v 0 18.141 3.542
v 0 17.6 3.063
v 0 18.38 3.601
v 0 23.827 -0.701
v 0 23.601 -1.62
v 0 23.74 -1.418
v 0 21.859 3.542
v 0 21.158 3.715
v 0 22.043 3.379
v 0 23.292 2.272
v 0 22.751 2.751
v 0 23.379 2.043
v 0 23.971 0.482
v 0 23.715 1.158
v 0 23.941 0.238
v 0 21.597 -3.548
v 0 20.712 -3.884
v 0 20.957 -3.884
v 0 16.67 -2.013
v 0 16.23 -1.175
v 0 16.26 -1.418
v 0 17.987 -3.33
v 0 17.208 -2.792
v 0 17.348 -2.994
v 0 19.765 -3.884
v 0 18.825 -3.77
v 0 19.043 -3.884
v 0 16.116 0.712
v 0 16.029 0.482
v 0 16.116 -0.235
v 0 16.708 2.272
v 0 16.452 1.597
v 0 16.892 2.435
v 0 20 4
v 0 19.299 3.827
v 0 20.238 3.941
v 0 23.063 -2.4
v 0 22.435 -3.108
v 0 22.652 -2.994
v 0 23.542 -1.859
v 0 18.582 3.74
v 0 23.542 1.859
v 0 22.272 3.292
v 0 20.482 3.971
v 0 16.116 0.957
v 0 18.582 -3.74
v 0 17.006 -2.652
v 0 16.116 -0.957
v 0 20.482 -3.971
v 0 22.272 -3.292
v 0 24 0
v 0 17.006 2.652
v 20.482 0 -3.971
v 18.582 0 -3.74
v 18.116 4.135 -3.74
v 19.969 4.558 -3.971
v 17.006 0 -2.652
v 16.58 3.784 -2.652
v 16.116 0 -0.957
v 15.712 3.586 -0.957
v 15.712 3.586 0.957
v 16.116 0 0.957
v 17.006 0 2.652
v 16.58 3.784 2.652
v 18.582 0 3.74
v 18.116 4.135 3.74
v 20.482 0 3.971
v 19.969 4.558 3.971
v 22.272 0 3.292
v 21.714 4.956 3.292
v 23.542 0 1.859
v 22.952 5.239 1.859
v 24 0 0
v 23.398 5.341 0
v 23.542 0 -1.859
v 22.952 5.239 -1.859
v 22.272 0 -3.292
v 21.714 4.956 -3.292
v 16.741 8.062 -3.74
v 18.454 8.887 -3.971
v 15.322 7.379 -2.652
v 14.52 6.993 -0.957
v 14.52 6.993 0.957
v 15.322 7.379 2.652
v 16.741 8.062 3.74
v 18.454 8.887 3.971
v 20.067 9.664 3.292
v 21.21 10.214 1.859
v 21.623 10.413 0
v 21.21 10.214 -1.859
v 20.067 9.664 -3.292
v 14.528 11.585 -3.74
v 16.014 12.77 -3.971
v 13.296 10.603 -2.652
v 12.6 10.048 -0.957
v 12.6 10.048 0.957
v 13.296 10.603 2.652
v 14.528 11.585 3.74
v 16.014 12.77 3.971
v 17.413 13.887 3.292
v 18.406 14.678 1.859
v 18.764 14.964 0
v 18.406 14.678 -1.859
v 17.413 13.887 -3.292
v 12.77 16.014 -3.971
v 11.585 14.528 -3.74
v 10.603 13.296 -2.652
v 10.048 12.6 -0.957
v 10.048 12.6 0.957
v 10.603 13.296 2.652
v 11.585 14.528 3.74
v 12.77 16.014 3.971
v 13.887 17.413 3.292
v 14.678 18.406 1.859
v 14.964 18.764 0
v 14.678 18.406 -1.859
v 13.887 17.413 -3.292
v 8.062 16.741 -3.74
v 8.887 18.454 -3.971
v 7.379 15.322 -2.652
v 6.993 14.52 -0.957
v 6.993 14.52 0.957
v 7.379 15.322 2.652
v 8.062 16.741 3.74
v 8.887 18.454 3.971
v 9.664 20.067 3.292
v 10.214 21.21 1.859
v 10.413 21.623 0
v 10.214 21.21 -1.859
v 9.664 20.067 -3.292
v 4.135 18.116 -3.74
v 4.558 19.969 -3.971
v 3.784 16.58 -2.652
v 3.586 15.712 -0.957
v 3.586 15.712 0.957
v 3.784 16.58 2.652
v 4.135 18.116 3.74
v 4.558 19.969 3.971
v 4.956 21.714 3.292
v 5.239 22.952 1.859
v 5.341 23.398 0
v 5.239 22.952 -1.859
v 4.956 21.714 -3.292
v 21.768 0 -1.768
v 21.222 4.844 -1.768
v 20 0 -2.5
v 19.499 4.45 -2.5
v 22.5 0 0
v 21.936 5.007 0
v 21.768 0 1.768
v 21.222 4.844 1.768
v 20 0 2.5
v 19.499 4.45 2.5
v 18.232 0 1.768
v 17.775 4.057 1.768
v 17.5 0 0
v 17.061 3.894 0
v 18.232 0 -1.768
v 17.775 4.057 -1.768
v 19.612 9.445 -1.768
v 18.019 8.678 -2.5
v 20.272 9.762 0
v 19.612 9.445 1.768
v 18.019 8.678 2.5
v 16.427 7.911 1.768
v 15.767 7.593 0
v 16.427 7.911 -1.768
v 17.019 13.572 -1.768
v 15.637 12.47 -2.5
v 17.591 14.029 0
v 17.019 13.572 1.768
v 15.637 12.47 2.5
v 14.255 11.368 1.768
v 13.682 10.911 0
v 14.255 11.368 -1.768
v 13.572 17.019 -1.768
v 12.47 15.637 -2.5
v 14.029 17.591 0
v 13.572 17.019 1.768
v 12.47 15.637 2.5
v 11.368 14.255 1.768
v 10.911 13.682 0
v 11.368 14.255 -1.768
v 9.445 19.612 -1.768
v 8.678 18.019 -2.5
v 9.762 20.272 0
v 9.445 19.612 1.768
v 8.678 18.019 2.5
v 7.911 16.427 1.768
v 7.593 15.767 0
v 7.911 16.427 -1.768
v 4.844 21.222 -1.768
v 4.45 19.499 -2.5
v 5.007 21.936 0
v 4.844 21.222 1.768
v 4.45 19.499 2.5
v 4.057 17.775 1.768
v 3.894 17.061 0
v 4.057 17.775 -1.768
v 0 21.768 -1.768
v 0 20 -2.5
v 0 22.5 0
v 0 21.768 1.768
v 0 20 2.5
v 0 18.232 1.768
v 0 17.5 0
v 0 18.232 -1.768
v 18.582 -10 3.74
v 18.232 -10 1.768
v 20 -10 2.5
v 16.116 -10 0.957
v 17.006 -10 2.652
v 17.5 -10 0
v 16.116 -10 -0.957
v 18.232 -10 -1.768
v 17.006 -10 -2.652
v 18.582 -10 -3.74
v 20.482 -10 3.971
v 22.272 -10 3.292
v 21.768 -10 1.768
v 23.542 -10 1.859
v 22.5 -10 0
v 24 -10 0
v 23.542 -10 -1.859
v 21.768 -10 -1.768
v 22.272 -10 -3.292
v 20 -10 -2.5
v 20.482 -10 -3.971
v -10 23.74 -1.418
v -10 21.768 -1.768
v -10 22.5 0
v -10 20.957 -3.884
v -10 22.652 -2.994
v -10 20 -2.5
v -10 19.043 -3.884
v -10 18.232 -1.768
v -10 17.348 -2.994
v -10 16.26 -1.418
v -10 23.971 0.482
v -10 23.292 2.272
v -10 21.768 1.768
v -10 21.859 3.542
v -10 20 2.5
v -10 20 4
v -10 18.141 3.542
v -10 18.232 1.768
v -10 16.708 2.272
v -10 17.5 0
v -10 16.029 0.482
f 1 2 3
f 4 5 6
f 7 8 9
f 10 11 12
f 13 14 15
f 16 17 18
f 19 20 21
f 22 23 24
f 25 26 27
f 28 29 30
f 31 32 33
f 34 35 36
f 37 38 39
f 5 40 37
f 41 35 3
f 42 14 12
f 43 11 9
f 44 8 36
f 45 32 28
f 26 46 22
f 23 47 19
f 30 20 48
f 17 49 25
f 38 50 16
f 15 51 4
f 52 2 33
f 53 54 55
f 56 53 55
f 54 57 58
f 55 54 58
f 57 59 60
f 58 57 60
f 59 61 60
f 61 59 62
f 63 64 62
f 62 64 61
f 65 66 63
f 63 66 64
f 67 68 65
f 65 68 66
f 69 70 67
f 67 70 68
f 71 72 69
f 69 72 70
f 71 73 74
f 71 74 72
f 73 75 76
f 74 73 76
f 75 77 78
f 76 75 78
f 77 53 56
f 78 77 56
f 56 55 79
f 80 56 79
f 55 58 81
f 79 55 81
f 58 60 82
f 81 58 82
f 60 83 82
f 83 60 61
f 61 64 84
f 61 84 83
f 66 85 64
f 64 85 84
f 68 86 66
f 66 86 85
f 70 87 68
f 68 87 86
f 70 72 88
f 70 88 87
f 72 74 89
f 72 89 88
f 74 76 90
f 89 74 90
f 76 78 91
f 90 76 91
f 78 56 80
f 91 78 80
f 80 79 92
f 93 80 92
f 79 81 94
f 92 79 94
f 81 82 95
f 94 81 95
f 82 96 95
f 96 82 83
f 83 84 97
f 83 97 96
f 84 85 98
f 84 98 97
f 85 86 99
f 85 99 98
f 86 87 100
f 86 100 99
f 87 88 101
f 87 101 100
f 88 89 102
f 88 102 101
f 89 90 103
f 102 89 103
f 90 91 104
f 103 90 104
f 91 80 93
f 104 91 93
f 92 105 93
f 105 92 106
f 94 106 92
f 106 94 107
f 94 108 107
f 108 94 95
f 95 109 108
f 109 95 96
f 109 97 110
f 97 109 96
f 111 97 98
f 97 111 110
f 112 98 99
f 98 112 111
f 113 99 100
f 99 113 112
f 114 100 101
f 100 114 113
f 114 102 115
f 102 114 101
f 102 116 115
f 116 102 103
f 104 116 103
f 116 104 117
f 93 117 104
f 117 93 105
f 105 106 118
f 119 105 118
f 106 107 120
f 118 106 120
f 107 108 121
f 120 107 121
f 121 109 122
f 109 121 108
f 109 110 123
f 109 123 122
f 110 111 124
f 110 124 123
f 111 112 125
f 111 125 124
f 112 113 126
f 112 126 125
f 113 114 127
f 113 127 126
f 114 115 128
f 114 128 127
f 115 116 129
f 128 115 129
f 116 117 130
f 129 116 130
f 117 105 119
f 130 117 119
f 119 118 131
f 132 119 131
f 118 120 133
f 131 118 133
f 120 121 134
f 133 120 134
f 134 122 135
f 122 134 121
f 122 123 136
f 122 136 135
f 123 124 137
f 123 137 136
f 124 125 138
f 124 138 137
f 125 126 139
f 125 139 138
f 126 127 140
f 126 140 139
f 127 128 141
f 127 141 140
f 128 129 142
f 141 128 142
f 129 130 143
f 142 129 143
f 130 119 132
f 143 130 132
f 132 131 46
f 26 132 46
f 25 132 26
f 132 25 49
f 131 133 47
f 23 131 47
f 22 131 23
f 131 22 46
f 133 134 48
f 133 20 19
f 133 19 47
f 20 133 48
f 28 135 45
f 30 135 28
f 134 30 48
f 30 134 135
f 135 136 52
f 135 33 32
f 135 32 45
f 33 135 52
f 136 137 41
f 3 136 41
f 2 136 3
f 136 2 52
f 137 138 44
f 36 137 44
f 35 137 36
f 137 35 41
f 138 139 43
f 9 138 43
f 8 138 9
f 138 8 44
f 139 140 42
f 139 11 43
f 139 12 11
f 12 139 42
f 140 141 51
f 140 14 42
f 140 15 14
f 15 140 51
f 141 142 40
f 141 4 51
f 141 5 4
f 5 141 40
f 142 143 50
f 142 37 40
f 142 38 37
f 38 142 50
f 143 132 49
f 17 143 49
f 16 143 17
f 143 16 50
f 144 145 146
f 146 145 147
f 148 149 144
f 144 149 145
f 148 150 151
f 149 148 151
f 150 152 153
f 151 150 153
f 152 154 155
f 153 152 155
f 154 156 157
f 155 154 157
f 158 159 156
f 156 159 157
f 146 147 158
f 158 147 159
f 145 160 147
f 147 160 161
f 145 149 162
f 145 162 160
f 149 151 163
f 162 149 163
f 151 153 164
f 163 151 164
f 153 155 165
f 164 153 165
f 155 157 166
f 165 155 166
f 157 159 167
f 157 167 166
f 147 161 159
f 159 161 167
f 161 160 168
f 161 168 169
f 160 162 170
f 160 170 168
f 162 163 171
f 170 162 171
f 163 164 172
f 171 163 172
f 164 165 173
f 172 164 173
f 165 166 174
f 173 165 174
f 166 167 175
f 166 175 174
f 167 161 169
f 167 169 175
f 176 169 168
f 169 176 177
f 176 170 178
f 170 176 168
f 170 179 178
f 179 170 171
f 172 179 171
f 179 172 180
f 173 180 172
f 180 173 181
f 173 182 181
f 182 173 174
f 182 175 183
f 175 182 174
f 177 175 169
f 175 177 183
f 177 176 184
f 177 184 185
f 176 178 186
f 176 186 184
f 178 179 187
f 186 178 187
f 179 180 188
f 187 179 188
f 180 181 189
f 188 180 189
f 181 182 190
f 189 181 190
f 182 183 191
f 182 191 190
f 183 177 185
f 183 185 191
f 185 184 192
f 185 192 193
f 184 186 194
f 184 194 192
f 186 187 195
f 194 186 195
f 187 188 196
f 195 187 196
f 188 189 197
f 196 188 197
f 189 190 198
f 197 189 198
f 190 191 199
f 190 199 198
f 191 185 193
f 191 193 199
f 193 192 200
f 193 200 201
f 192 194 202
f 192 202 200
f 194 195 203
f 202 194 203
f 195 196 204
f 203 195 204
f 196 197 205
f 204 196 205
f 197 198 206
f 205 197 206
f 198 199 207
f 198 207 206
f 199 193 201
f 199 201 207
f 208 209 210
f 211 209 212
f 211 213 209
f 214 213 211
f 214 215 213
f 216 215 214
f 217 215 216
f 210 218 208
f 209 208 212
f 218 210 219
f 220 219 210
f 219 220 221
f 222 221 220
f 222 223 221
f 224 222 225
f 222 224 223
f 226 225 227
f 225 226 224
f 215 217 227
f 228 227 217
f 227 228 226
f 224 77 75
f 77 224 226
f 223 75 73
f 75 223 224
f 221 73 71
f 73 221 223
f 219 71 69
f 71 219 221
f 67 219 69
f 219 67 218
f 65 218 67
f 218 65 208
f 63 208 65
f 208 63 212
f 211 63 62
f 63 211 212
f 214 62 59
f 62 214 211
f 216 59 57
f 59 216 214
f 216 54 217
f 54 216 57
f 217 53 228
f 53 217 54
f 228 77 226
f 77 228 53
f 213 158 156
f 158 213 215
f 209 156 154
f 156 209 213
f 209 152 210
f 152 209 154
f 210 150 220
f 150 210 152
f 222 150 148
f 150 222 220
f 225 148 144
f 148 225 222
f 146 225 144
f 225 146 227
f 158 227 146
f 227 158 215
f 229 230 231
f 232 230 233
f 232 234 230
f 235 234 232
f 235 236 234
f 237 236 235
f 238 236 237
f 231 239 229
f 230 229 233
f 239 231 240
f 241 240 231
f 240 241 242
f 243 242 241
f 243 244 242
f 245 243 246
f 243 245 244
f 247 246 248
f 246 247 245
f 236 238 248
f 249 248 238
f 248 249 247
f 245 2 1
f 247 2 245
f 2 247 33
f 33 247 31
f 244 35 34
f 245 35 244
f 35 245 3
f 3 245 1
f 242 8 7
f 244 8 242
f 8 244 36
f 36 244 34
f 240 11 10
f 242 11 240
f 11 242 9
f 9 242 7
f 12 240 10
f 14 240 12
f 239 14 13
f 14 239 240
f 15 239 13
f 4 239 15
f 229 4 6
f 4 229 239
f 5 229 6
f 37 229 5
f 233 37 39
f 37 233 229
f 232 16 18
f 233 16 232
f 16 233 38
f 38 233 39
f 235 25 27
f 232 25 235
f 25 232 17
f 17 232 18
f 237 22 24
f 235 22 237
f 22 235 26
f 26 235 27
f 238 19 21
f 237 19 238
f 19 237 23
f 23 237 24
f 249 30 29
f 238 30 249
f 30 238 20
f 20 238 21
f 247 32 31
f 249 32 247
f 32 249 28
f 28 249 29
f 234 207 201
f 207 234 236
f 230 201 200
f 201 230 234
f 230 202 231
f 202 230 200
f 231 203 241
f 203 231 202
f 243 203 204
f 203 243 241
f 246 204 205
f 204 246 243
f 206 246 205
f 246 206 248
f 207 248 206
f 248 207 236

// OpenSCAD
// Zweck: pipe bend via rotate_extrude(angle = 90) with two straight connectors.
r_bend = 20;
d_out = 8;
wall = 1.5;
module section() difference() {
    circle(d = d_out);
    circle(d = d_out - 2 * wall);
}
rotate_extrude(angle = 90) translate([r_bend, 0]) section();
// Connector at the start of the bend (plane y = 0), towards -y
translate([r_bend, 0, 0]) rotate([90, 0, 0]) linear_extrude(height = 10) section();
// Connector at the end of the bend (plane x = 0), towards -x
translate([0, r_bend, 0]) rotate([0, -90, 0]) linear_extrude(height = 10) section();
